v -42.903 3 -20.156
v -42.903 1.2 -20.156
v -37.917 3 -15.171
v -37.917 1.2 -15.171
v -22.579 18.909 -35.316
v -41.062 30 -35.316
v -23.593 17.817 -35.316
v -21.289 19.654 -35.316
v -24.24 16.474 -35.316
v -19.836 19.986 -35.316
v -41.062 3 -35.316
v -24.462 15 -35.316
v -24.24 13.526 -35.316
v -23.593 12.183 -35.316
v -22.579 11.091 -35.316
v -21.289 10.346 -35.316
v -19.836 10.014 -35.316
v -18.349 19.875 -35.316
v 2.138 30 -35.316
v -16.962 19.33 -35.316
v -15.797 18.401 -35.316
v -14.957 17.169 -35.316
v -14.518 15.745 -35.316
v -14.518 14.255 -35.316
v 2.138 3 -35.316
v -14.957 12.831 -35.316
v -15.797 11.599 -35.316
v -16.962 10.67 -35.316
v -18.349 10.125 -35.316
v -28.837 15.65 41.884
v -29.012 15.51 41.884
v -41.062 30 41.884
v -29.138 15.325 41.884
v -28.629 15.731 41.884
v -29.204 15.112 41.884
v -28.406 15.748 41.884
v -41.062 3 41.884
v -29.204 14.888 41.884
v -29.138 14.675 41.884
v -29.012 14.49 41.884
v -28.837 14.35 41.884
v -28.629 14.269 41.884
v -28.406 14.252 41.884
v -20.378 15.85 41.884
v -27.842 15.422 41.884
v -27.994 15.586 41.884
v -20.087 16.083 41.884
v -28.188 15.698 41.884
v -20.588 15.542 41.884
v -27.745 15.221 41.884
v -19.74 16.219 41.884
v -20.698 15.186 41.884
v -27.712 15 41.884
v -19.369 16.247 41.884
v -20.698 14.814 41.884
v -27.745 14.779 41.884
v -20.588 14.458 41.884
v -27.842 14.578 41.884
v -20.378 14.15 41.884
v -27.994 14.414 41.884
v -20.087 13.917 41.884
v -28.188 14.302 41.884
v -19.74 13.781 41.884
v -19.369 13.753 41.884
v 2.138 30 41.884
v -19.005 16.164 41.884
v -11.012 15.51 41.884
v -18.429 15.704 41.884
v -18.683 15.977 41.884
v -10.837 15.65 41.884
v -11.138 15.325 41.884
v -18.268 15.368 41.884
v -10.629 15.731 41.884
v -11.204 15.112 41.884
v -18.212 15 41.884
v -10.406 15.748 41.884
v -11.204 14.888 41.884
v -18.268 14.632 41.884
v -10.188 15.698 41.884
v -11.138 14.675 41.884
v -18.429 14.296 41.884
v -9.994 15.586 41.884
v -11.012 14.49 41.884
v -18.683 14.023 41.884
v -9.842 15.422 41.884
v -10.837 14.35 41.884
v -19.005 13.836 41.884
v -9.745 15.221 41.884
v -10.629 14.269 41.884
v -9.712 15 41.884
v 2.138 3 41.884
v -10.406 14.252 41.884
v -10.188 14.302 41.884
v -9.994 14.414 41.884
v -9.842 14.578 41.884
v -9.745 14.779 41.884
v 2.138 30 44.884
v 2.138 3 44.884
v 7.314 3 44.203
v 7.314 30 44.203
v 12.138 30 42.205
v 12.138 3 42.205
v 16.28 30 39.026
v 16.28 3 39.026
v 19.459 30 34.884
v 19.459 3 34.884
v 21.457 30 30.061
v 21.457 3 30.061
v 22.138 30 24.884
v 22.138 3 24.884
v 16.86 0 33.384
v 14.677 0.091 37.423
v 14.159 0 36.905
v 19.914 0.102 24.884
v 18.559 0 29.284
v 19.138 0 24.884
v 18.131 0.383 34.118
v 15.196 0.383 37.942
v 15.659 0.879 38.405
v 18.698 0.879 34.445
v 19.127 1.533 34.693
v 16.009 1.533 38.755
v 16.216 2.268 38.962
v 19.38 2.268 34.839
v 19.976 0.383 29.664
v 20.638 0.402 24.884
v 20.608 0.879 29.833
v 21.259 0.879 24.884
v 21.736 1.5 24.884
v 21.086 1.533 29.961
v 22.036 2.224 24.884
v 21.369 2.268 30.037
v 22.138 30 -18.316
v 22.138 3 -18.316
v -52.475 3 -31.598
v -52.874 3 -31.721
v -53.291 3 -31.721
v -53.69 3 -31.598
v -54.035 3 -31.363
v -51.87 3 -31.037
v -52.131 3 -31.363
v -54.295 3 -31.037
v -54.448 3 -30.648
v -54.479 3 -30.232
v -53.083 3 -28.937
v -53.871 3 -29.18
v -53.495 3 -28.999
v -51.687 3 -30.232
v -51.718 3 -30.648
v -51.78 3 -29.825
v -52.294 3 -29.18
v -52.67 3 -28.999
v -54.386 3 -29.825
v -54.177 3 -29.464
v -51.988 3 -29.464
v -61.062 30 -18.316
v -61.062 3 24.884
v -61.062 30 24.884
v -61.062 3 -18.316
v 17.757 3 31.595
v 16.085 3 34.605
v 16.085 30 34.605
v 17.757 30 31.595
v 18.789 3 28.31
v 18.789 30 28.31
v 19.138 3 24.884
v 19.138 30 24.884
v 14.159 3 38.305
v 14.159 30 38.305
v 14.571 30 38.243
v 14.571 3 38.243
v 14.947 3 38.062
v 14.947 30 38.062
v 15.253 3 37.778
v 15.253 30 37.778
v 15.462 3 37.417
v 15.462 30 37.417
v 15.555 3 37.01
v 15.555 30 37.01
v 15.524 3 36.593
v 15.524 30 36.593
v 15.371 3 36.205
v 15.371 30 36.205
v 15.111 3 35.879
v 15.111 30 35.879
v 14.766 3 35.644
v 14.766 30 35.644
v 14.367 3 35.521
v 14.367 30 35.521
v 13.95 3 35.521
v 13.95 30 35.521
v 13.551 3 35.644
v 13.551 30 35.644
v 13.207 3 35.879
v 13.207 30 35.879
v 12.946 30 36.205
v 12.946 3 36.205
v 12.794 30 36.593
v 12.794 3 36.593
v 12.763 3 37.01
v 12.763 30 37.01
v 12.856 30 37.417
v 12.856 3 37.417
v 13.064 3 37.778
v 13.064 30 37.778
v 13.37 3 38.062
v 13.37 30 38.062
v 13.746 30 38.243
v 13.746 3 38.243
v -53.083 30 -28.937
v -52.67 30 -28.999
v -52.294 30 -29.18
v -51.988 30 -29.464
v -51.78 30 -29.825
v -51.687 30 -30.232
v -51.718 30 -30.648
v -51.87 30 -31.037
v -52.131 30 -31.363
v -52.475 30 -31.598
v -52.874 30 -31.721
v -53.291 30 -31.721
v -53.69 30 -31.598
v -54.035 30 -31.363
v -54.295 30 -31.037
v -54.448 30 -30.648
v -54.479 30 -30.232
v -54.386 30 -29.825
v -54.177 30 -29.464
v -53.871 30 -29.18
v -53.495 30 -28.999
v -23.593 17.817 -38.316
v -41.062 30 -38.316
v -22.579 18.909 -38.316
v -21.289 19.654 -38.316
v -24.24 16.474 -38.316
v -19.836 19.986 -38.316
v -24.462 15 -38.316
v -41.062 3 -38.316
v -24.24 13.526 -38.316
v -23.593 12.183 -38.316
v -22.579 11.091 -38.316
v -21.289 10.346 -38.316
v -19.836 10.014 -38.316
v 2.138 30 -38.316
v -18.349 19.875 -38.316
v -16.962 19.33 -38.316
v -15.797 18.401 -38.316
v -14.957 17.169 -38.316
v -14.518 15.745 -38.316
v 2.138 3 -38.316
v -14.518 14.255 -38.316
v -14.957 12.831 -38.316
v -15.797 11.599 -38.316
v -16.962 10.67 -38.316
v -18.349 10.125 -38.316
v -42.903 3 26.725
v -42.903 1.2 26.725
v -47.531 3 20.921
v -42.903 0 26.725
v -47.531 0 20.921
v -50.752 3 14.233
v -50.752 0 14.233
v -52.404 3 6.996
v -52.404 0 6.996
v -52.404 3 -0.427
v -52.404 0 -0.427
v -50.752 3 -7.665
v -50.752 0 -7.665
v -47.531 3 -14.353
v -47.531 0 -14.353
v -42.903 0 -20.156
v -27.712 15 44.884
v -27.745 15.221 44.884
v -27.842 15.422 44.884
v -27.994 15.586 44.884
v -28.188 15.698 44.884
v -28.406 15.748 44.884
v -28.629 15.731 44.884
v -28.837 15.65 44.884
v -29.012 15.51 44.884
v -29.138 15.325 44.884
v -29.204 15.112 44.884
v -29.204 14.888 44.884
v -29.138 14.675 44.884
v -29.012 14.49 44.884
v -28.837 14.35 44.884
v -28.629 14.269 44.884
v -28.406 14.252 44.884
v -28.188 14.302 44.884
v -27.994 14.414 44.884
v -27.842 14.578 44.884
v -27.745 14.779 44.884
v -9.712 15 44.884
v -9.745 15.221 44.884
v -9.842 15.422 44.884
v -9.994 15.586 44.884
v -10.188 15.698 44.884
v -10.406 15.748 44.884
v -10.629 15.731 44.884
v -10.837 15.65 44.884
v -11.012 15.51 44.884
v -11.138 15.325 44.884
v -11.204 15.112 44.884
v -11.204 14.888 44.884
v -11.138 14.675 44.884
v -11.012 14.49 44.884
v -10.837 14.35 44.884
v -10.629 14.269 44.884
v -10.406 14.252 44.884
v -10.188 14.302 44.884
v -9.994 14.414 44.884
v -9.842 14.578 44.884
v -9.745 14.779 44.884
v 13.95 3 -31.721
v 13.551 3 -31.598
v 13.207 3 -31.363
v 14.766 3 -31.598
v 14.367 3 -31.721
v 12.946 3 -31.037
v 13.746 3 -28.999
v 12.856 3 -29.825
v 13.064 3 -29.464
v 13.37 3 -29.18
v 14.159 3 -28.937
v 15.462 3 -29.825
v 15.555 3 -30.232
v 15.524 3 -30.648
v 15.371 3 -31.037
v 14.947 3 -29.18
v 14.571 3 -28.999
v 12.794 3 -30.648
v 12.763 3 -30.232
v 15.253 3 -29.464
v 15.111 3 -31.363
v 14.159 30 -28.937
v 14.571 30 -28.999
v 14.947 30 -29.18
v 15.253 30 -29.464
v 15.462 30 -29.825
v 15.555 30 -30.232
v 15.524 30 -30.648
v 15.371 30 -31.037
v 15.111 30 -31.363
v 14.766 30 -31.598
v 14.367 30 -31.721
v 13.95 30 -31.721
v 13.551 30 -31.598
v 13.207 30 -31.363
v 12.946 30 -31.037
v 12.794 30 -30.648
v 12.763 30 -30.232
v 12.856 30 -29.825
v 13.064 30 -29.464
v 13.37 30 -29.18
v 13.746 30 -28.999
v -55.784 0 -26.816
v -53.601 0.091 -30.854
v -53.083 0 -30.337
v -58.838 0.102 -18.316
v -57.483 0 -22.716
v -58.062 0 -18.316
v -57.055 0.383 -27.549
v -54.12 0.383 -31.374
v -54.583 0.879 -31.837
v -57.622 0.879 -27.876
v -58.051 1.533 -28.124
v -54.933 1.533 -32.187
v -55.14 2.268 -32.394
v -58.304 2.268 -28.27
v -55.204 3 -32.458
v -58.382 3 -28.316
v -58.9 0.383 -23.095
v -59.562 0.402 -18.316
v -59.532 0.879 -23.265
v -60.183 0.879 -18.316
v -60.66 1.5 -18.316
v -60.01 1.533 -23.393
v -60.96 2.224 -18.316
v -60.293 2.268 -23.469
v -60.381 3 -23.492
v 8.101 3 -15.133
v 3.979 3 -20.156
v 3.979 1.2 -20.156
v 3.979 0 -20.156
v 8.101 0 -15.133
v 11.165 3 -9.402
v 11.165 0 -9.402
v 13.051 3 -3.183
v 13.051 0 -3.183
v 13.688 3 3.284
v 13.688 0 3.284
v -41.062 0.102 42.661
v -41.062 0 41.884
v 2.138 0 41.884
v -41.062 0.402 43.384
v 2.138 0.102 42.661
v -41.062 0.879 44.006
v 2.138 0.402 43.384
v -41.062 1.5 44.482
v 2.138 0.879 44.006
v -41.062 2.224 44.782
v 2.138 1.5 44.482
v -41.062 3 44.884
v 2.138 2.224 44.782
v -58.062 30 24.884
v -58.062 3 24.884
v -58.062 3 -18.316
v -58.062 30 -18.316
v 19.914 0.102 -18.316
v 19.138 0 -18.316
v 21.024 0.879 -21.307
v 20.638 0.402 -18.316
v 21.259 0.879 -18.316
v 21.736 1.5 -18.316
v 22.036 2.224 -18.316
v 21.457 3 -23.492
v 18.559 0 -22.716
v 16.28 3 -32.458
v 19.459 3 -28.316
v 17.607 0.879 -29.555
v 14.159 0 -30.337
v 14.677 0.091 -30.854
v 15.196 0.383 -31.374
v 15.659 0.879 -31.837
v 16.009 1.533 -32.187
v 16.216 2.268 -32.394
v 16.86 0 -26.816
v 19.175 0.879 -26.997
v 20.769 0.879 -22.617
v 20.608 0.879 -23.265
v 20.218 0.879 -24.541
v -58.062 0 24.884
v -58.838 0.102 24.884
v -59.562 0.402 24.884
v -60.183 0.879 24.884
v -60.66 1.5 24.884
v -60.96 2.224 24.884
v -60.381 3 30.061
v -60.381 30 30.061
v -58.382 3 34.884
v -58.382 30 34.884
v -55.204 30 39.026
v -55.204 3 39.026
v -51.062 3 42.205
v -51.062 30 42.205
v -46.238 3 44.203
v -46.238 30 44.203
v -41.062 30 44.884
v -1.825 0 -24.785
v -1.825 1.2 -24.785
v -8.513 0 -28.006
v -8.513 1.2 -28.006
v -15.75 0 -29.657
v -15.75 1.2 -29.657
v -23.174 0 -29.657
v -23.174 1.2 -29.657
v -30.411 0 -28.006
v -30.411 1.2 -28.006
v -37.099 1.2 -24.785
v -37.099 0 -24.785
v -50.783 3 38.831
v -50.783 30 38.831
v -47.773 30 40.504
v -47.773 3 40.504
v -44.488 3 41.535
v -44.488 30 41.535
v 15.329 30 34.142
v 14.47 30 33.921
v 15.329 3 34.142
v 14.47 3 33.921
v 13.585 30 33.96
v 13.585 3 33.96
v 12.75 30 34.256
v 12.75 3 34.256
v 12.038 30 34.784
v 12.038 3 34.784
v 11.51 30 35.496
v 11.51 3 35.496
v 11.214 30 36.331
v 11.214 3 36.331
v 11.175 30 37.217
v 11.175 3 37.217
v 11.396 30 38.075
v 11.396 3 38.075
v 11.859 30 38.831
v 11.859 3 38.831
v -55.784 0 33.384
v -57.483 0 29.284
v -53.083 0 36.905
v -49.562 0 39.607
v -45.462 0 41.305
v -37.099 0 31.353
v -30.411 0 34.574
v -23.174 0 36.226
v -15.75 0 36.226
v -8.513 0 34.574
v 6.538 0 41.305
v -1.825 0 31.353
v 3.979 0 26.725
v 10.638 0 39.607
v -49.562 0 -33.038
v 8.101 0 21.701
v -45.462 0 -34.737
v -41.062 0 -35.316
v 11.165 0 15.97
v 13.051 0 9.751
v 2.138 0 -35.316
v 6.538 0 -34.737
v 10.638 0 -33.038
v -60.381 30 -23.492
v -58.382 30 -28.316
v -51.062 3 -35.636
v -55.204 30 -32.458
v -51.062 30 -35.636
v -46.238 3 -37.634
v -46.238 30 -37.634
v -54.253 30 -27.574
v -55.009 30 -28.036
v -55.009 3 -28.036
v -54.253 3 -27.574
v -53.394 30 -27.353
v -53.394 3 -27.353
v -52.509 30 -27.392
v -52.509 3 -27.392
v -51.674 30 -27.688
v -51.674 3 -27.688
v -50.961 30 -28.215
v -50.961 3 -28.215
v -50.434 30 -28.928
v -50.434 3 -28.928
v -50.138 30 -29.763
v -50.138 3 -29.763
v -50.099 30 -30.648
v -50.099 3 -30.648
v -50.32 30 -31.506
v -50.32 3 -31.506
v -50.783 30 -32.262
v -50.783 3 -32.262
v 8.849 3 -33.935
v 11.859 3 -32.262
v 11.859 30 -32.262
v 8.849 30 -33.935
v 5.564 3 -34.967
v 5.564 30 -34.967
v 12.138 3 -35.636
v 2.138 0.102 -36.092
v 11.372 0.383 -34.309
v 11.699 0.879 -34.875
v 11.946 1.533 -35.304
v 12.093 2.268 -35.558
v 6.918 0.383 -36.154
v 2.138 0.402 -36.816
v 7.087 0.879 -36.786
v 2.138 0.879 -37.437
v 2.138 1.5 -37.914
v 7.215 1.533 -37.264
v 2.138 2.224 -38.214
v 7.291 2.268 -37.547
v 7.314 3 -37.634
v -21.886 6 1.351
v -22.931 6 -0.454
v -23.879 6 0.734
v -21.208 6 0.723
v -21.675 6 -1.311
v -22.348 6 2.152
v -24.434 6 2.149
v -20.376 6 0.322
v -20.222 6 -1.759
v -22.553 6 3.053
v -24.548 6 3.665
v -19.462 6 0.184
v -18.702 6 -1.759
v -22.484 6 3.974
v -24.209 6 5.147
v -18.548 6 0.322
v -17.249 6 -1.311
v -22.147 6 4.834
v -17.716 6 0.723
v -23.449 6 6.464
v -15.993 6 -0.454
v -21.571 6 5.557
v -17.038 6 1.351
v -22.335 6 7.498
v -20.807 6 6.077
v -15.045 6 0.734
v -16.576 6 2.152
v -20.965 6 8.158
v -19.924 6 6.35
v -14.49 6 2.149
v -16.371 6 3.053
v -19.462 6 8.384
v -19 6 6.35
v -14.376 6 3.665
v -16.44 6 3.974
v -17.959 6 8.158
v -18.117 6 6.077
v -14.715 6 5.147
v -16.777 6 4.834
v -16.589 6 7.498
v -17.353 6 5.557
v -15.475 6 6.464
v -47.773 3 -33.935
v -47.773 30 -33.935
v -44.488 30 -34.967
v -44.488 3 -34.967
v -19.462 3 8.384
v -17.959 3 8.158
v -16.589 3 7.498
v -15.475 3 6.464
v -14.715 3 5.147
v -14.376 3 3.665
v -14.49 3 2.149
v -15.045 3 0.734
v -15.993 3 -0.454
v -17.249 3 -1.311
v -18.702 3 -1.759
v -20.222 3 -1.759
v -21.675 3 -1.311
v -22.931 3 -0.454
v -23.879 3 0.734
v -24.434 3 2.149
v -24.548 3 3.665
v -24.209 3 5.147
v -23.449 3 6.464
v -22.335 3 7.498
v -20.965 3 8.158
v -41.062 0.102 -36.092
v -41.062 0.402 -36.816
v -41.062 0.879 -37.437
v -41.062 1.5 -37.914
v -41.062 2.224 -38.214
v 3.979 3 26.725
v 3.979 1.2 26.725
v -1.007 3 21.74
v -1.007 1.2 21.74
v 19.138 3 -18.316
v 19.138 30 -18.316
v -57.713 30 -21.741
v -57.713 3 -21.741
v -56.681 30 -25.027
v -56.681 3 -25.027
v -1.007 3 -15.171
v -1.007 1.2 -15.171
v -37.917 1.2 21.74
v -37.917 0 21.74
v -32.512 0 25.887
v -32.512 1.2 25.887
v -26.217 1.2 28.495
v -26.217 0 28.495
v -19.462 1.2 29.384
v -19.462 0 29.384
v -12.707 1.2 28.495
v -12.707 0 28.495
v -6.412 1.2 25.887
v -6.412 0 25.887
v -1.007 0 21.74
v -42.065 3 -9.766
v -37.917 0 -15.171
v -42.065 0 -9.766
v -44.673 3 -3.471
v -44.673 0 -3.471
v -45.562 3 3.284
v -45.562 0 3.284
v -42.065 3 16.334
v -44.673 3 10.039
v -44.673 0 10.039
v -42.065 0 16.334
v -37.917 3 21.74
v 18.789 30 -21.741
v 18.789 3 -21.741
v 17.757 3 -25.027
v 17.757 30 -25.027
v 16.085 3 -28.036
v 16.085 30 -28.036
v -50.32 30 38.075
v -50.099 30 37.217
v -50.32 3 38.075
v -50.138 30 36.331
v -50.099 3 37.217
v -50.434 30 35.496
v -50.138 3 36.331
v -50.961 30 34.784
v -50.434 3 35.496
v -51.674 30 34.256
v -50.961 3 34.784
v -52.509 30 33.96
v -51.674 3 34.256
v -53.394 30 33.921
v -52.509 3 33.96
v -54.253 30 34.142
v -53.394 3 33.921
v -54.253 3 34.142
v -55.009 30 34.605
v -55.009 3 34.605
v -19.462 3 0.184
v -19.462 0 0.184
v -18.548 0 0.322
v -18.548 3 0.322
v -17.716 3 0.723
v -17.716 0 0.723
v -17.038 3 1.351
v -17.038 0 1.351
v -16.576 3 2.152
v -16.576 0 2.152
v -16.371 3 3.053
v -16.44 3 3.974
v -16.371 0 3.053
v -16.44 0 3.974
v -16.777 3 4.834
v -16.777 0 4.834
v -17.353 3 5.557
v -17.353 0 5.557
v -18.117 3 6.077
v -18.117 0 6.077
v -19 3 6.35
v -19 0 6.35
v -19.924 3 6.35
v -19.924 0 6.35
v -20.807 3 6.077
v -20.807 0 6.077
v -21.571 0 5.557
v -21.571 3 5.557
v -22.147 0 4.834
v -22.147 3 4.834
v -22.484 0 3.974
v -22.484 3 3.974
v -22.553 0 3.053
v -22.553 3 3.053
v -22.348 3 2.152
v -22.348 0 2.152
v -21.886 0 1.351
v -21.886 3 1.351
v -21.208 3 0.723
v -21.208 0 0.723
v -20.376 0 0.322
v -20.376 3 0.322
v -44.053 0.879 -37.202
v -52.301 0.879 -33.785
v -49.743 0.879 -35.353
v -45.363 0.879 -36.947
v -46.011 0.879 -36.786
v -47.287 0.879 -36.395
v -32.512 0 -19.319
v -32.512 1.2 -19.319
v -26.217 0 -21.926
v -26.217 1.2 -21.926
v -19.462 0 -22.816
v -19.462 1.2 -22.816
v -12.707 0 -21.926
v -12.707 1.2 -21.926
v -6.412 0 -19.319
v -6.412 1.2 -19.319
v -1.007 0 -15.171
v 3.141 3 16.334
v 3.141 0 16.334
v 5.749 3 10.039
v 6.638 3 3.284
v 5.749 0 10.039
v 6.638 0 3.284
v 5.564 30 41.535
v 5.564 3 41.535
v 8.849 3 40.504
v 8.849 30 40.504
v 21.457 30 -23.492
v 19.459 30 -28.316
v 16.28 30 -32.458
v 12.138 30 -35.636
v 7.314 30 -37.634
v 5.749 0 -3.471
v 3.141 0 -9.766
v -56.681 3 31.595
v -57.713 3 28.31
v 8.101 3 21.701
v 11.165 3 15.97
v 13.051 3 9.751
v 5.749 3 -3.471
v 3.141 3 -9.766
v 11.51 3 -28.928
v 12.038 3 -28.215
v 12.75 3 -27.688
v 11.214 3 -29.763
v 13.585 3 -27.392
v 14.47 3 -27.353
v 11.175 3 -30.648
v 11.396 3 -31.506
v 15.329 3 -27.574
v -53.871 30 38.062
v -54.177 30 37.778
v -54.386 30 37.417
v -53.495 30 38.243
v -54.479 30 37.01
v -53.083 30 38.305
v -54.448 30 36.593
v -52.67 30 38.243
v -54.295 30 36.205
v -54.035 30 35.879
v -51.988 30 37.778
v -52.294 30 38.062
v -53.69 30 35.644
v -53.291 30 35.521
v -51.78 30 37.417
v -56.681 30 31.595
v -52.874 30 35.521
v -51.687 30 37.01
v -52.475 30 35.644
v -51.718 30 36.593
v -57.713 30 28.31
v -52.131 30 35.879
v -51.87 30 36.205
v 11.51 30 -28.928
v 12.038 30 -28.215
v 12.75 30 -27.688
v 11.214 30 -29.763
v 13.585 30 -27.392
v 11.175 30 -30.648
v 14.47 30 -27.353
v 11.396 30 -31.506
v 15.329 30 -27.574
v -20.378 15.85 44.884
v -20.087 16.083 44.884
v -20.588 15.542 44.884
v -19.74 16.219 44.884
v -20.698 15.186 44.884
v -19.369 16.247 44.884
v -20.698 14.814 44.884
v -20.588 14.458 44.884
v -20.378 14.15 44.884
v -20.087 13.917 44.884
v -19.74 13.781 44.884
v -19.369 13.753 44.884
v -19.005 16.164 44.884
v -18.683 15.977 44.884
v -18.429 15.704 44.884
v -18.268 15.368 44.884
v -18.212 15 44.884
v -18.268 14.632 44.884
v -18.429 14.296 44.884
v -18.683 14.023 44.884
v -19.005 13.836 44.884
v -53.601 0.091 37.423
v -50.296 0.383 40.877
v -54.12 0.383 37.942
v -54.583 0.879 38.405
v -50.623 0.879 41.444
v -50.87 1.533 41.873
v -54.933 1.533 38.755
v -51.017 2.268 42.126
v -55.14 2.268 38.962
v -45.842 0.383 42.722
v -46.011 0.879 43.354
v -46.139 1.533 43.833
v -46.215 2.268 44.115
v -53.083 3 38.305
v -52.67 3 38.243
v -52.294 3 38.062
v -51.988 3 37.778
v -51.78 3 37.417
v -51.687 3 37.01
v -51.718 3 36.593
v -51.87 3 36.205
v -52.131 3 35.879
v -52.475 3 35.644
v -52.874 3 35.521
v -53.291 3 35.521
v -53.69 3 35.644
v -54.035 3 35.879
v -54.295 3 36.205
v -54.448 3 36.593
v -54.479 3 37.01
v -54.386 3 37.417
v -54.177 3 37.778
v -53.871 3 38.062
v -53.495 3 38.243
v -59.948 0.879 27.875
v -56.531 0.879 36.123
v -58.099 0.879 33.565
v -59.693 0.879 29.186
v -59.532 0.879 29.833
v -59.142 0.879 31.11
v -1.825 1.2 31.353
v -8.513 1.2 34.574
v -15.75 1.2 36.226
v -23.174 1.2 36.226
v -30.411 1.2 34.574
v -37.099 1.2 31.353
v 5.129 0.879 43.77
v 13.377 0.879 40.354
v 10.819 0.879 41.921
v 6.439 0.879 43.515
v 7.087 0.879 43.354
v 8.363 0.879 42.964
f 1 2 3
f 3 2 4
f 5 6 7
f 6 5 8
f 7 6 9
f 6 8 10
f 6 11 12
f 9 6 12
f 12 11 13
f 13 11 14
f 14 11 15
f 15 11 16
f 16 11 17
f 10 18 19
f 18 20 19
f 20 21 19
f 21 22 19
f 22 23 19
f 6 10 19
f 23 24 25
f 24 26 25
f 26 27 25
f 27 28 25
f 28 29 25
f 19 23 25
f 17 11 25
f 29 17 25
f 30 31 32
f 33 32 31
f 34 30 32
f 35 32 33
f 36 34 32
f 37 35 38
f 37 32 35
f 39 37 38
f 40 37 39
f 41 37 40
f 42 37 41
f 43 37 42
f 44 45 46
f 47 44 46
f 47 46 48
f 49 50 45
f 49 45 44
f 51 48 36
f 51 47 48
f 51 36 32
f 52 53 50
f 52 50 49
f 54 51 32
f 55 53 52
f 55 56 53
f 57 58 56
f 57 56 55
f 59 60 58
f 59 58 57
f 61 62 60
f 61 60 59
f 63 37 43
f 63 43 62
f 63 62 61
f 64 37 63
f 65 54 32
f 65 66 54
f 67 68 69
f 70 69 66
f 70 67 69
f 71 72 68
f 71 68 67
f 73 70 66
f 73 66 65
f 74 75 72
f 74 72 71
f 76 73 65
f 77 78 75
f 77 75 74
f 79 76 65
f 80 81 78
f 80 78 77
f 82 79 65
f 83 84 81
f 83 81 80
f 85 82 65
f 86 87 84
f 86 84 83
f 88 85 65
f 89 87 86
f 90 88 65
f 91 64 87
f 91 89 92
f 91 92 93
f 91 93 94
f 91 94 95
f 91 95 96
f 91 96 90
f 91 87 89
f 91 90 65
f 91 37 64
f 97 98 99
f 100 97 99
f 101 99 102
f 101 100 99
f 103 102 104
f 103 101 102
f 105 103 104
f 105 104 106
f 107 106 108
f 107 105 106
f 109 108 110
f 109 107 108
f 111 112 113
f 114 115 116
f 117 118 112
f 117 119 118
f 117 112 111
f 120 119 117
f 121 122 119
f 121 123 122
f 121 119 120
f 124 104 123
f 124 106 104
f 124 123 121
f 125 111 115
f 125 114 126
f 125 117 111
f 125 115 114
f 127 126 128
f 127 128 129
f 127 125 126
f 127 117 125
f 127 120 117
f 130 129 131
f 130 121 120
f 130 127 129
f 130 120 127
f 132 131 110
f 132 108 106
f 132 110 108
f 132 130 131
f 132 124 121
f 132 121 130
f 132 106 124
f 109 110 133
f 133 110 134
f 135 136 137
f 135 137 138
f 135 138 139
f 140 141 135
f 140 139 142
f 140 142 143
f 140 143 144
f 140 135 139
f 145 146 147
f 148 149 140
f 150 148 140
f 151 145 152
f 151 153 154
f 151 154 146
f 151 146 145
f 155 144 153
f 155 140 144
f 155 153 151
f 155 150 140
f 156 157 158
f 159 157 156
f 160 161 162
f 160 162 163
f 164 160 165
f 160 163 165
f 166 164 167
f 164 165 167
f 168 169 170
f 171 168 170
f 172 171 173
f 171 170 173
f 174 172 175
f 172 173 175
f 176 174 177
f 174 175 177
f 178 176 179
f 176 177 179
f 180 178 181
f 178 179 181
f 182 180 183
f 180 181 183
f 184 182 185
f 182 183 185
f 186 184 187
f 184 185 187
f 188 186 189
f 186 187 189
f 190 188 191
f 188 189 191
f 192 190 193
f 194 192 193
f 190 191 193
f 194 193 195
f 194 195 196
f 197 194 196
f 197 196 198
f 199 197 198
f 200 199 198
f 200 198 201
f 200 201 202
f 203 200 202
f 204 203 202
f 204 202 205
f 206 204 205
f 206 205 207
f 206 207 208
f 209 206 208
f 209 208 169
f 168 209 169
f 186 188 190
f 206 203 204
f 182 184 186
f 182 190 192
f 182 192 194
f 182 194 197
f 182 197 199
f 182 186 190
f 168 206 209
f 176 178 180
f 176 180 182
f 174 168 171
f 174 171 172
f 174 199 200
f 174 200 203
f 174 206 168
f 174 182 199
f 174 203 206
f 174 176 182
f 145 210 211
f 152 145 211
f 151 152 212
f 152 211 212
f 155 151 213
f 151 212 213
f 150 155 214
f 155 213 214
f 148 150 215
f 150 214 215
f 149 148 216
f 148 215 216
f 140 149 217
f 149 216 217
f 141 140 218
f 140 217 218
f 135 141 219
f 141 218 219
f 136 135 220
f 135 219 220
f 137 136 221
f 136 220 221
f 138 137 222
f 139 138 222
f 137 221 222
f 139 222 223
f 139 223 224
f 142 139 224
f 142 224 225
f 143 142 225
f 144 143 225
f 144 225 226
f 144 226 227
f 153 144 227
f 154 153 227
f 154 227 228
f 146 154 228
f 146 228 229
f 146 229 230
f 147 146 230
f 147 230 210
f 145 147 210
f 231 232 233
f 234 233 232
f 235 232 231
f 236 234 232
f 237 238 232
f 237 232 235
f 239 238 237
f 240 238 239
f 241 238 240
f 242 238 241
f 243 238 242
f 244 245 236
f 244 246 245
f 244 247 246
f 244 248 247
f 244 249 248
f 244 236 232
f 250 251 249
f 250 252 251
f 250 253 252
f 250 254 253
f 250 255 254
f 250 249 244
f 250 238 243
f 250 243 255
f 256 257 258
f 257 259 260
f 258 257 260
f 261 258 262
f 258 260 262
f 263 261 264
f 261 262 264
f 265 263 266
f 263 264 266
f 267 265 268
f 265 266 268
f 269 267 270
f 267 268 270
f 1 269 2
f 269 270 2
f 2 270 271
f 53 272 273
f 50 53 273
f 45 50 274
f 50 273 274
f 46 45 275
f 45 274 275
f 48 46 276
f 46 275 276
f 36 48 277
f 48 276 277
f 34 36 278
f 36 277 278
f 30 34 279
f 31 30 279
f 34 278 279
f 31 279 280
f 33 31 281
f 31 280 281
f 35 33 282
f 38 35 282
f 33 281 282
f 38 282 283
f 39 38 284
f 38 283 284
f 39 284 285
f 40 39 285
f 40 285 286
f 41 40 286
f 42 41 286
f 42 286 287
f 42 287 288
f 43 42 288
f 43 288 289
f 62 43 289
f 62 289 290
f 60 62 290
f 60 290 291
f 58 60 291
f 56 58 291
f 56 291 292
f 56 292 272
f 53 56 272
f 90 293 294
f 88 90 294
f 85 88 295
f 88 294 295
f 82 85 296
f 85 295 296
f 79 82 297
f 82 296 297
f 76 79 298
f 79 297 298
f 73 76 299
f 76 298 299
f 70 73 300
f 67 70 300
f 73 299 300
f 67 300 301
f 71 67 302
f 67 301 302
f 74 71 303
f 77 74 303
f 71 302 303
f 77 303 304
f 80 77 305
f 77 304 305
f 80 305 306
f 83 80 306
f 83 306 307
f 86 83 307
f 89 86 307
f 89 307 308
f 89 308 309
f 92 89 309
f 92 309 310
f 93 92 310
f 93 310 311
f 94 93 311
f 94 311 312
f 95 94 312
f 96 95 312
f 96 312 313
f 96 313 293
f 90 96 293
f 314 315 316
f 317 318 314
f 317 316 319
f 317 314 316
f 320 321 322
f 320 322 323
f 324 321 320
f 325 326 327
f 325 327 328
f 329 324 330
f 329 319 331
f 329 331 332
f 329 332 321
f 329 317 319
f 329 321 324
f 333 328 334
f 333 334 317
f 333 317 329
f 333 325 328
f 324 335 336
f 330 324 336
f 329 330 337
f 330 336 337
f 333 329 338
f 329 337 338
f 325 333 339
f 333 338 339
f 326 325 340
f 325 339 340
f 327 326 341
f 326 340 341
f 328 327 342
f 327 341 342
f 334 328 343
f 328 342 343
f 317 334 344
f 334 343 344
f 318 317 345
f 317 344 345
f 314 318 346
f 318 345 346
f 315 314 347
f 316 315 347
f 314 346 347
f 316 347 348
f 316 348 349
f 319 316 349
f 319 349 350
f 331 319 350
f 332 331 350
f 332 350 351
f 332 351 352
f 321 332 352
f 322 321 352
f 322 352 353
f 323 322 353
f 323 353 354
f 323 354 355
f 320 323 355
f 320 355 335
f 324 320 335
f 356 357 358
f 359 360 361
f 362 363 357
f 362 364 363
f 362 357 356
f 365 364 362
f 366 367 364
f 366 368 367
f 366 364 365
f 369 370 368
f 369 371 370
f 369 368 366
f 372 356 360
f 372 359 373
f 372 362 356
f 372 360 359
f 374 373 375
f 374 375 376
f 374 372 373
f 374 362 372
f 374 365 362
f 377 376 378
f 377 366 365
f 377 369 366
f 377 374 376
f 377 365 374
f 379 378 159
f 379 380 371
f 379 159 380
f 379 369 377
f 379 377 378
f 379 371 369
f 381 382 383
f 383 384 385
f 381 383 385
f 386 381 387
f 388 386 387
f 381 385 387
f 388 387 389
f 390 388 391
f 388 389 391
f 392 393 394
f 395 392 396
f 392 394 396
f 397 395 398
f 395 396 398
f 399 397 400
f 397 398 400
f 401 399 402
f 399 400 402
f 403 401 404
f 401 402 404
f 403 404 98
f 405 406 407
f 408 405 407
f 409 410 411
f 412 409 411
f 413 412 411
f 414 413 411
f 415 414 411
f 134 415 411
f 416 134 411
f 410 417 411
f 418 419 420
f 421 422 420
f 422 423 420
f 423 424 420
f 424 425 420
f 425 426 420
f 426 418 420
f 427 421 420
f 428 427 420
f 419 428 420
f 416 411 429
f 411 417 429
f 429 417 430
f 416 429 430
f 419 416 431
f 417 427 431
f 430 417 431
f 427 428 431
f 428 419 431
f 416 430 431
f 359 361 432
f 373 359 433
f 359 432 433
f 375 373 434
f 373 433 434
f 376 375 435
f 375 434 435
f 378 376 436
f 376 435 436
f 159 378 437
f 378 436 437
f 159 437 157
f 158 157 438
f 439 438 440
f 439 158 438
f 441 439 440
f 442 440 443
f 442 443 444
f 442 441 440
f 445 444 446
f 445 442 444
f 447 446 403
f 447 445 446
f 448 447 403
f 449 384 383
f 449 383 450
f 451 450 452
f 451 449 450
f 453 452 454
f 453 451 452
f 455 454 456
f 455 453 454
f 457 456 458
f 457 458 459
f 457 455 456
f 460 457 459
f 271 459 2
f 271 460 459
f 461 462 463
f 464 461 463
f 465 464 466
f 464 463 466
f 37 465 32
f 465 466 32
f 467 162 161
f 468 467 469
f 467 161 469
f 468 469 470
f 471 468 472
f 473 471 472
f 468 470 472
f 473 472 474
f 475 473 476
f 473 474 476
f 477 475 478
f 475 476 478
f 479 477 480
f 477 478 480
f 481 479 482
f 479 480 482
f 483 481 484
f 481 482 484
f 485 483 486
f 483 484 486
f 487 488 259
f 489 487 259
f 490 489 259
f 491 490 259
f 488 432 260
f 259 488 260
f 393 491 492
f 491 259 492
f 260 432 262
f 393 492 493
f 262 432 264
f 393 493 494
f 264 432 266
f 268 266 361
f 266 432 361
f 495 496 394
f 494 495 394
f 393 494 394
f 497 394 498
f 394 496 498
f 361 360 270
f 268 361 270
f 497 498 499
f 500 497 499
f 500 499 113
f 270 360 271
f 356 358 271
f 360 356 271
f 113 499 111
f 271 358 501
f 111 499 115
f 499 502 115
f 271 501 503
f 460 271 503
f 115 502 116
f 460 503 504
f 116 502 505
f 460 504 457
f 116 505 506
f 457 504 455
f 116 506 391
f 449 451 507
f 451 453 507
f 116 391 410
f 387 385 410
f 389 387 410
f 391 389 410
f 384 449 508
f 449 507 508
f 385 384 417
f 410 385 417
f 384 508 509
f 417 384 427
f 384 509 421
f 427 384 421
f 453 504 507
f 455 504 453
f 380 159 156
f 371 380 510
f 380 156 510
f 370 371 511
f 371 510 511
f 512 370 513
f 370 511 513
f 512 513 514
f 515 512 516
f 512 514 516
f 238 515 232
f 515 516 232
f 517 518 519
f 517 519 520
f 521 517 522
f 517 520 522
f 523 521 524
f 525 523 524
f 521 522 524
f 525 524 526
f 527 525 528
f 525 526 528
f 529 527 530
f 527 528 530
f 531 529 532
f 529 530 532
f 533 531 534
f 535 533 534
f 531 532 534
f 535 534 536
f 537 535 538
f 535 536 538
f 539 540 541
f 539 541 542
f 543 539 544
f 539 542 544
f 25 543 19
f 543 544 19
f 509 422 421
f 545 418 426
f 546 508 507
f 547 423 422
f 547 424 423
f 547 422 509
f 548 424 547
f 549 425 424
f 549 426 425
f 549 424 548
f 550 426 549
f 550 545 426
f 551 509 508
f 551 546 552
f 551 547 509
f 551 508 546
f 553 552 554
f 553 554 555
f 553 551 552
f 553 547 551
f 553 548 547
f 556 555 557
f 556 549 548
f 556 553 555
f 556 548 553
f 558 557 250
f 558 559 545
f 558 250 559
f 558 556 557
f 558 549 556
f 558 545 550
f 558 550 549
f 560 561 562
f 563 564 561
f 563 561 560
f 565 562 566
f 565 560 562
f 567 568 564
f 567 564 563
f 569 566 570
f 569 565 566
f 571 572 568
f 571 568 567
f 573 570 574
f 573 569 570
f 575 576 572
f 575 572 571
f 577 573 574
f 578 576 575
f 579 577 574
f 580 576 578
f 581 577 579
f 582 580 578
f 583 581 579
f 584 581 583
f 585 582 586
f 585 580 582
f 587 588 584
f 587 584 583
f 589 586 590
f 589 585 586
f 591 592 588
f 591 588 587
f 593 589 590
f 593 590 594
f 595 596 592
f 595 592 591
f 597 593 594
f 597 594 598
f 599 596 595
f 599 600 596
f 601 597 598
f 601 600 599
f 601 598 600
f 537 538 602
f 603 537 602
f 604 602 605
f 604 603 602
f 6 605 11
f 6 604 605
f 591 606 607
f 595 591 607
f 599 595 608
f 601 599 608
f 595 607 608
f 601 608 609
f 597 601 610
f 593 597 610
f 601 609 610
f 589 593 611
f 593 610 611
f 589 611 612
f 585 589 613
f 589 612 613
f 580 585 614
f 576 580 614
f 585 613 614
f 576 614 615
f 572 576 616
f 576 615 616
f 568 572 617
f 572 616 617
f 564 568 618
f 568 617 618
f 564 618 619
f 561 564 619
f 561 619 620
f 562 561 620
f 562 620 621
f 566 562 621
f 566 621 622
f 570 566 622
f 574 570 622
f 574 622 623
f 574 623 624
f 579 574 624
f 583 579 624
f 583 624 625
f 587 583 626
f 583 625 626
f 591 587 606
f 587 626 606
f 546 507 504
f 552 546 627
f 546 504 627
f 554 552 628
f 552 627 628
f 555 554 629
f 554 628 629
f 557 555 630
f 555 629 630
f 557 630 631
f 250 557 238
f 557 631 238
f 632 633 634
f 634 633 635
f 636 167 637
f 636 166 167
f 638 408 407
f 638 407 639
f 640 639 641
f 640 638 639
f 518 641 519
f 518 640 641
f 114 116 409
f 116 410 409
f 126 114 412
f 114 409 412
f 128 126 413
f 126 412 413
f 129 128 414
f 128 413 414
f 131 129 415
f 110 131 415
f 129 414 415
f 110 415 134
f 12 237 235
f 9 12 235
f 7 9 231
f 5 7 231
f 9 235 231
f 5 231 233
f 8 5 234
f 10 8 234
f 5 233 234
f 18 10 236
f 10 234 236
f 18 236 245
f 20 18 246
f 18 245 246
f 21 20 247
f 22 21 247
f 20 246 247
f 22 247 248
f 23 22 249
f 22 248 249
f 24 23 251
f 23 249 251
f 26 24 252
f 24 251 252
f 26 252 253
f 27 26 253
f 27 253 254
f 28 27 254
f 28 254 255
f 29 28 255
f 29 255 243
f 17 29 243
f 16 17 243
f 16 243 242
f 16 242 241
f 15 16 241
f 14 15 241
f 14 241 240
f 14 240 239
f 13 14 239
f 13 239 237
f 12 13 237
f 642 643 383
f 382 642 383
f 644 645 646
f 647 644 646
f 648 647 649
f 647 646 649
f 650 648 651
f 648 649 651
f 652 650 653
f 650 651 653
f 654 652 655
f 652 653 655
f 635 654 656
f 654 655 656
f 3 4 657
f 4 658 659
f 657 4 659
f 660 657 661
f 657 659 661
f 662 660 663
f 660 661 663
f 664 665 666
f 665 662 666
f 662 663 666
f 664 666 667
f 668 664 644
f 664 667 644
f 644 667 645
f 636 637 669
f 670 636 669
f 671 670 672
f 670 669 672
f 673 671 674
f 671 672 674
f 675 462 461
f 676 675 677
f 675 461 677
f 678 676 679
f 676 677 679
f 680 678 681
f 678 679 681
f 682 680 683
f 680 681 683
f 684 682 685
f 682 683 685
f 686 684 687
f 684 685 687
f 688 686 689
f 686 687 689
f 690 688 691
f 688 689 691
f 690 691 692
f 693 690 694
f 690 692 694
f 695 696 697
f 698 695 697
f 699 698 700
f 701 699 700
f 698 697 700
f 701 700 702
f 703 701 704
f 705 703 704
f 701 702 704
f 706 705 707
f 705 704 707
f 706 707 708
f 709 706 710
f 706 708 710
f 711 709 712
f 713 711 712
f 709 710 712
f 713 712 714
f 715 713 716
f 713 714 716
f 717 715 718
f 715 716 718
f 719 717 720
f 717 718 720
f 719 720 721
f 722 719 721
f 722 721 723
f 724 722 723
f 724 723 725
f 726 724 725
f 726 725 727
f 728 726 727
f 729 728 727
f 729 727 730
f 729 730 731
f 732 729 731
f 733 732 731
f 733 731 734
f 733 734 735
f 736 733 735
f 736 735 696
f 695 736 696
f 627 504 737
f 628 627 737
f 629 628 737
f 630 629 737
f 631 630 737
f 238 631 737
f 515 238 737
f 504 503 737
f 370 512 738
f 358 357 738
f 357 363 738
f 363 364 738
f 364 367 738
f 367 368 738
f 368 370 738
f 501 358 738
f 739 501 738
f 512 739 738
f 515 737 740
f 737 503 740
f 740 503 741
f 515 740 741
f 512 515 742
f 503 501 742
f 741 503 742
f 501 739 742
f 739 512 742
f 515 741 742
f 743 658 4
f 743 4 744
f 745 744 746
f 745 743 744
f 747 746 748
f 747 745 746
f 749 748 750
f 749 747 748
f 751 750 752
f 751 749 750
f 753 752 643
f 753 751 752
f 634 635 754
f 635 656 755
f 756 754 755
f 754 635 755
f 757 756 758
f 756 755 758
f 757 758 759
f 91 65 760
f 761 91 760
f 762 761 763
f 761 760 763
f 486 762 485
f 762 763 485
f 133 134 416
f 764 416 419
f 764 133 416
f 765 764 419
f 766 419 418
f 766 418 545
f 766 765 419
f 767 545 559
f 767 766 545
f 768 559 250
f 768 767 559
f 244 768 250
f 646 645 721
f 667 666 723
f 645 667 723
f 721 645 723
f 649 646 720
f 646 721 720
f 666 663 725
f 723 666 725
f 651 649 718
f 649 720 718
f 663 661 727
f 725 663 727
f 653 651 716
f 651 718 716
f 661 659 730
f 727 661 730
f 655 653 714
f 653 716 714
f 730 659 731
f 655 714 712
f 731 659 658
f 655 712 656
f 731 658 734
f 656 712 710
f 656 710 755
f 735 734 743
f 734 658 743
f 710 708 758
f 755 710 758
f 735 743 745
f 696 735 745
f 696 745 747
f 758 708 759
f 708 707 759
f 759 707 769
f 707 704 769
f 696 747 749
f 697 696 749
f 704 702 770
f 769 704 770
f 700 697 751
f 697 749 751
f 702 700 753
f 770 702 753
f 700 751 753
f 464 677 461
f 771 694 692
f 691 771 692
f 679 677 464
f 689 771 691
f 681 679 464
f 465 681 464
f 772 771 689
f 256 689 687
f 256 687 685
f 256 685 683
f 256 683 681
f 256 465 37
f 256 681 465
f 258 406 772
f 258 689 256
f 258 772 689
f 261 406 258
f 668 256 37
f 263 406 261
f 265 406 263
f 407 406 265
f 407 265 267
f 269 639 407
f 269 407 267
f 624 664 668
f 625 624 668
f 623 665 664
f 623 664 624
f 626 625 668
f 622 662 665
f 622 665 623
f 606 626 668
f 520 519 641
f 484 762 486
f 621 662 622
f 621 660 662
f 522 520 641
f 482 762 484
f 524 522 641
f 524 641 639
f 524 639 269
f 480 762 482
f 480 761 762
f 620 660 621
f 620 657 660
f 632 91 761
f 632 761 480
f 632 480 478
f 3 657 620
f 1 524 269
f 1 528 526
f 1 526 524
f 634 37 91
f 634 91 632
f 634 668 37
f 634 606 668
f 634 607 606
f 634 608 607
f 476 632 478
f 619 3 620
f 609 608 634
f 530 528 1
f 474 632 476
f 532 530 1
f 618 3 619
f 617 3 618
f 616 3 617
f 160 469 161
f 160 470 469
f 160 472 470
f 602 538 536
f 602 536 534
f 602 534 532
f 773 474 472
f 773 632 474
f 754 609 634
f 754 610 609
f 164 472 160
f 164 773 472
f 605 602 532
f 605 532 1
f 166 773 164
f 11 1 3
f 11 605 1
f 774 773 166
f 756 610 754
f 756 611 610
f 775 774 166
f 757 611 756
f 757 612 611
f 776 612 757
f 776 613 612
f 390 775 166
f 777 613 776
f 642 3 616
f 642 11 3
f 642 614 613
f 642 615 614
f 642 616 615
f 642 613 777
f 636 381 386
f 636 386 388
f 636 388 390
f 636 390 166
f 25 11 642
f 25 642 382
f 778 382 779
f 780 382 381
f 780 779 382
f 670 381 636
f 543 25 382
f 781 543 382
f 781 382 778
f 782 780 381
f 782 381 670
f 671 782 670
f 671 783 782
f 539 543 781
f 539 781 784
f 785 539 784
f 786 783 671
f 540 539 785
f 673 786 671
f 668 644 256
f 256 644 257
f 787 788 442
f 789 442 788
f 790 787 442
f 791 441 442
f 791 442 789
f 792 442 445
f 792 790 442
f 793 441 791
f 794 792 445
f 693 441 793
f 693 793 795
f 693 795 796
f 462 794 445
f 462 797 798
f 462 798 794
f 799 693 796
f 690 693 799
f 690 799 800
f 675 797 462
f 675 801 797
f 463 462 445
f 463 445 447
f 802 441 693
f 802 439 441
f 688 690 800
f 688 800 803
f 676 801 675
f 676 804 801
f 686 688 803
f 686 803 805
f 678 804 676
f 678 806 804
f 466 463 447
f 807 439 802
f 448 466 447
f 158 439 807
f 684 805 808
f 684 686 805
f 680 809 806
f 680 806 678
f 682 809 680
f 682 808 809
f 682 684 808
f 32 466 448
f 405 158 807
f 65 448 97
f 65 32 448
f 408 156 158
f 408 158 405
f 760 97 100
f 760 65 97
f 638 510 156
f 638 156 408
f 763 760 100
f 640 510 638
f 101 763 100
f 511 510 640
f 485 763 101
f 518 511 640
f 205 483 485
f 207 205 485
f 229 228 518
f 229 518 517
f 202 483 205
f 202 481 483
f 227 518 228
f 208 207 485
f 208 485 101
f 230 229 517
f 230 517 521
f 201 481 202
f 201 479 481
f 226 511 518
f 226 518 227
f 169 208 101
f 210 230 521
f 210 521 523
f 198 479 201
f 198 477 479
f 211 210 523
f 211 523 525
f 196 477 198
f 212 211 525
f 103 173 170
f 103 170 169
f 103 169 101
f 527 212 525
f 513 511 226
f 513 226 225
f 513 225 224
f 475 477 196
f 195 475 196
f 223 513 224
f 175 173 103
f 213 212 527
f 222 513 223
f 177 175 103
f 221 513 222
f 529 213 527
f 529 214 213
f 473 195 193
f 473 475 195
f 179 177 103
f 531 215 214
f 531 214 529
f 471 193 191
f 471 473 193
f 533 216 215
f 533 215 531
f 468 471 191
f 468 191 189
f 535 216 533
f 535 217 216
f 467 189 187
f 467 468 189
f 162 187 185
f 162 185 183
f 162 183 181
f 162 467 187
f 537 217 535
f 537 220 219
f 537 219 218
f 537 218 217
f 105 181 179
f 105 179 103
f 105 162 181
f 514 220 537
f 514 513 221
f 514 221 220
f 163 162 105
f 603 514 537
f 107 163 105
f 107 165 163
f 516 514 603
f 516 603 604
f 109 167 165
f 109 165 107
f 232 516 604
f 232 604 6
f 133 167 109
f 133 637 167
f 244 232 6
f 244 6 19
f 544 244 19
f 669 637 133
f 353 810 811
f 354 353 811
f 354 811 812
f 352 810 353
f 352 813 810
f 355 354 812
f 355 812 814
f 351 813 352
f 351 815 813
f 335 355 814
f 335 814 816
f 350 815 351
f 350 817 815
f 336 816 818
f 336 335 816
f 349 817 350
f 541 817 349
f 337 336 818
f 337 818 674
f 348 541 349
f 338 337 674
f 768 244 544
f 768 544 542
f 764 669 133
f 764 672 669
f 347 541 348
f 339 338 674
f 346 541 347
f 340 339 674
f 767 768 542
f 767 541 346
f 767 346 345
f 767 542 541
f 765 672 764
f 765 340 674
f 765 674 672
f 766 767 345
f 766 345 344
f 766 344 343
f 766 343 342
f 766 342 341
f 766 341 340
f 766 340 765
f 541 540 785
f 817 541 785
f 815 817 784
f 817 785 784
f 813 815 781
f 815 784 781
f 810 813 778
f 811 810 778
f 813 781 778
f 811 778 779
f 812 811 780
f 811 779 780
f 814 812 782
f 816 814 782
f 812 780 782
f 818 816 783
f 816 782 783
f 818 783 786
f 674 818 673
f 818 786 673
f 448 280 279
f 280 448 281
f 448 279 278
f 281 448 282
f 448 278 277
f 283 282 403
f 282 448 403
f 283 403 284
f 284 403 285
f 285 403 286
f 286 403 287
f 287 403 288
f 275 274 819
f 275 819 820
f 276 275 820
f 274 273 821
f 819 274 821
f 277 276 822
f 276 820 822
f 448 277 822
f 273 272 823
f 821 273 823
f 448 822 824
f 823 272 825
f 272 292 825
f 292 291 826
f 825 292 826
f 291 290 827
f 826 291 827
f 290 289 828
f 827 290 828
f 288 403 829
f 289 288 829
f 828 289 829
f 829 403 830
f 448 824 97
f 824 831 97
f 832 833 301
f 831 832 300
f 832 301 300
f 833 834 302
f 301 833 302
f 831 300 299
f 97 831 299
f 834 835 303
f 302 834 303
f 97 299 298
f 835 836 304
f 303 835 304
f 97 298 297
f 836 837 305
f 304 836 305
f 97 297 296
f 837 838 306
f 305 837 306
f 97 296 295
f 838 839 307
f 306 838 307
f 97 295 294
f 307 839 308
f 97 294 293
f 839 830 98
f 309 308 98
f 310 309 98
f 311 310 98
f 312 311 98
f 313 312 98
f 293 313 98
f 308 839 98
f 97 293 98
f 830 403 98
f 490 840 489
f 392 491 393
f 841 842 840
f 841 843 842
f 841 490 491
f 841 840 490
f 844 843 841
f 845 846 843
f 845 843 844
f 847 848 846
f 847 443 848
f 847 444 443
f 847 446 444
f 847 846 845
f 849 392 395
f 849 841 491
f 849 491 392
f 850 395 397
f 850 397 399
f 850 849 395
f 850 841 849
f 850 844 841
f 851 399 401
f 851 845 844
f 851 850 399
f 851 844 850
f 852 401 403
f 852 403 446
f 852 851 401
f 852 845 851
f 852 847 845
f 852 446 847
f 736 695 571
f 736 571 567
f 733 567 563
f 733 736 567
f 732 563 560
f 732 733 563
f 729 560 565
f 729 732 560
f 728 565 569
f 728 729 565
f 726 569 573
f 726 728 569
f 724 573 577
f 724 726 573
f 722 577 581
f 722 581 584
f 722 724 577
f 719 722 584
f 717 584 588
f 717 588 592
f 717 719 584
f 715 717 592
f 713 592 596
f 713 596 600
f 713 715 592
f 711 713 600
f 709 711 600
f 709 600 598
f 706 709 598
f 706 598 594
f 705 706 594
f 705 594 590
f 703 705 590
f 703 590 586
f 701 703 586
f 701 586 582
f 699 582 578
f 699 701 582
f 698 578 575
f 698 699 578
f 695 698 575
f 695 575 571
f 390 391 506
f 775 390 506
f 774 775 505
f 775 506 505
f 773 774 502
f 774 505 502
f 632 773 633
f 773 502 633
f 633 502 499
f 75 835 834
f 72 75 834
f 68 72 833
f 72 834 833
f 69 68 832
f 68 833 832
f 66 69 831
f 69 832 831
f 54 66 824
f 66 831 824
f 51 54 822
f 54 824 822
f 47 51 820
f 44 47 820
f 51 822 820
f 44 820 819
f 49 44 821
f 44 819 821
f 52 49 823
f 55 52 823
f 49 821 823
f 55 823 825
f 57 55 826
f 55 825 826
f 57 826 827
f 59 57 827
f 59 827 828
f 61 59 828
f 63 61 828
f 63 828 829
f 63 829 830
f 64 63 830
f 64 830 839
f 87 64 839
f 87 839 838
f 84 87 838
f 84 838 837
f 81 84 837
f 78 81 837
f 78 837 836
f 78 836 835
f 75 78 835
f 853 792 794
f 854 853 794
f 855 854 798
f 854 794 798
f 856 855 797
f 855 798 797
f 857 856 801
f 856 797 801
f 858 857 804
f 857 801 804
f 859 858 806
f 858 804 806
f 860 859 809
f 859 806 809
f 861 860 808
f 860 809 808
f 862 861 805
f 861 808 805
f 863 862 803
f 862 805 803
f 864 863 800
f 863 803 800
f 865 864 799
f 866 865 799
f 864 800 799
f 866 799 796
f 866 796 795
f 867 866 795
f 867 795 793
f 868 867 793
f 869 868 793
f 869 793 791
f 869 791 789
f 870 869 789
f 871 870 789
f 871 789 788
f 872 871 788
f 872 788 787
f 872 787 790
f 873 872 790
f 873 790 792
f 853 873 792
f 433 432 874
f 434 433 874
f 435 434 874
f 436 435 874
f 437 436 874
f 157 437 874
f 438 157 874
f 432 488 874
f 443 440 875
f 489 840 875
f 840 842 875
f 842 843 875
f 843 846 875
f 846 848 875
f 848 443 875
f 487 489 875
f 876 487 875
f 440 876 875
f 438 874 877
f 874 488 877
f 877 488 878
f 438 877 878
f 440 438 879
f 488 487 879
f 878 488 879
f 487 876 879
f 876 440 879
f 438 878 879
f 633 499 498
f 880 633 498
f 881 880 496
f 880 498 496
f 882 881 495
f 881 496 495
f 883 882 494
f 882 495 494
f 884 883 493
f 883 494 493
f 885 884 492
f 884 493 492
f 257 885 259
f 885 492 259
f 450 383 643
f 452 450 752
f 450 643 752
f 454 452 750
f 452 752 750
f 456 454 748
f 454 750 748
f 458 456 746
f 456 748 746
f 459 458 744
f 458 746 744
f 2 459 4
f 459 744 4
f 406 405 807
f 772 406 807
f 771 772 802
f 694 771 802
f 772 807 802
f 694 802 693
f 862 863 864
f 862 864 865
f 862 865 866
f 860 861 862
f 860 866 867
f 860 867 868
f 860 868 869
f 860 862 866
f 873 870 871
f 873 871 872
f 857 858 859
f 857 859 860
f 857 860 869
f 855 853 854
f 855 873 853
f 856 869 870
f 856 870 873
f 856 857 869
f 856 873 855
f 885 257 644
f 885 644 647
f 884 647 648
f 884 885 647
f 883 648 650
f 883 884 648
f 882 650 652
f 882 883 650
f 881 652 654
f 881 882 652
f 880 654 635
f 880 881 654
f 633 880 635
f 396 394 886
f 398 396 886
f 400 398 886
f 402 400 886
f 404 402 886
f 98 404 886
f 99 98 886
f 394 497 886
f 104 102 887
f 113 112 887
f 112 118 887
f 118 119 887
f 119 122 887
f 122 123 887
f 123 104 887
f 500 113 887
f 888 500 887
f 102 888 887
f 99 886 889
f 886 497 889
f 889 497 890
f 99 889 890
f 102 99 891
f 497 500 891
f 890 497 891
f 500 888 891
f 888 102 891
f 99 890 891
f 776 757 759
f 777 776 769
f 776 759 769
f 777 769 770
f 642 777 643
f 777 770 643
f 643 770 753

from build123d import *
from build123d.topology import SkipClean

# Parameters (mm, degrees)
SKETCH1_W           = 83.2
SKETCH1_H           = 83.2
BOSS_EXTRUDE1_DEPTH = 30
FILLET1_R           = 20
SHELL2_T            = -3
SKETCH2_R           = 1.25
SKETCH2_R_2         = 0.75
CUT_EXTRUDE1_DEPTH  = 30
SKETCH3_R           = 5
CUT_EXTRUDE2_DEPTH  = 30
SKETCH4_R           = 3.1
CUT_EXTRUDE3_DEPTH  = 30
CUT_EXTRUDE4_DEPTH  = 1.2
SKETCH6_R           = 5.1
SKETCH6_R_2         = 3.1
BOSS_EXTRUDE2_DEPTH = 3
SKETCH7_R           = 3
BOSS_EXTRUDE3_DEPTH = 27
SKETCH9_R           = 1.4
CUT_EXTRUDE5_DEPTH  = 27
FILLET2_R           = 3


with BuildPart() as part:
    # Sketch1 → Boss-Extrude1 (new body)
    with BuildSketch(Plane(origin=(0, 0, 0), x_dir=(1, 0, 0), z_dir=(0, 1, 0))):
        with Locations((-19.461988304, -3.284210526)):
            Rectangle(SKETCH1_W, SKETCH1_H)
    extrude(amount=BOSS_EXTRUDE1_DEPTH)

    # Fillet1
    fillet1_edges = [part.edges().sort_by_distance(p)[0] for p in [
        (-61.061988304, 15, -38.315789474),
        (22.138011696, 15, -38.315789474),
        (22.138011696, 15, 44.884210526),
        (-61.061988304, 15, 44.884210526),
    ]]
    fillet(fillet1_edges, radius=FILLET1_R)

    # Shell2
    shell2_openings = [part.faces().sort_by_distance(p)[0] for p in [
        (-19.461988304, 30, 3.284210526),
    ]]
    offset(amount=SHELL2_T, openings=shell2_openings, kind=Kind.INTERSECTION)

    # Sketch2 → Cut-Extrude1 (cut)
    with BuildSketch(Plane.XY.offset(44.884210526)):
        with Locations((-19.461988304, 15)):
            Circle(SKETCH2_R)
        with Locations((-10.461988304, 15)):
            Circle(SKETCH2_R_2)
        with Locations((-28.461988304, 15)):
            Circle(SKETCH2_R_2)
    extrude(amount=-CUT_EXTRUDE1_DEPTH, mode=Mode.SUBTRACT)

    # Sketch3 → Cut-Extrude2 (cut)
    with BuildSketch(Plane(origin=(0, 0, -38.315789474), x_dir=(-1, 0, 0), z_dir=(0, 0, -1))):
        with Locations((19.461988304, 15)):
            Circle(SKETCH3_R)
    extrude(amount=-CUT_EXTRUDE2_DEPTH, mode=Mode.SUBTRACT)

    # Sketch4 → Cut-Extrude3 (cut)
    with BuildSketch(Plane.XZ):
        with BuildLine():
            ThreePointArc((13.688011696, 3.284210526), (11.164618199, 15.970166309), (3.978601492, 26.724800323))
            Line((3.978601492, 26.724800323), (-1.006501315, 21.739697515))
            ThreePointArc((-1.006501315, 21.739697515), (4.651267494, 13.272248111), (6.638011696, 3.284210526))
            ThreePointArc((6.638011696, 3.284210526), (4.651267494, -6.703827058), (-1.006501315, -15.171276463))
            Line((-1.006501315, -15.171276463), (3.978601492, -20.15637927))
            ThreePointArc((3.978601492, -20.15637927), (11.164618199, -9.401745257), (13.688011696, 3.284210526))
        make_face()
        with BuildLine():
            Line((-37.917475293, 21.739697515), (-42.9025781, 26.724800323))
            ThreePointArc((-42.9025781, 26.724800323), (-52.611988304, 3.284210526), (-42.9025781, -20.15637927))
            Line((-42.9025781, -20.15637927), (-37.917475293, -15.171276463))
            ThreePointArc((-37.917475293, -15.171276463), (-45.561988304, 3.284210526), (-37.917475293, 21.739697515))
        make_face()
        with Locations(Location((-19.461988304, 3.284210526, 0), (0, 0, 270))):
            Circle(SKETCH4_R)
    extrude(amount=-CUT_EXTRUDE3_DEPTH, mode=Mode.SUBTRACT)

    # Sketch5 → Cut-Extrude4 (cut)
    with SkipClean():  # the faces are left unmerged after this step: merging them gives an invalid solid
        with BuildSketch(Plane.XZ):
            with BuildLine():
                Line((-42.9025781, 26.724800323), (-37.917475293, 21.739697515))
                ThreePointArc((-37.917475293, 21.739697515), (-19.461988304, 29.384210526), (-1.006501315, 21.739697515))
                Line((-1.006501315, 21.739697515), (3.978601492, 26.724800323))
                ThreePointArc((3.978601492, 26.724800323), (-19.461988304, 36.434210526), (-42.9025781, 26.724800323))
            make_face()
            with BuildLine():
                Line((-1.006501315, -15.171276463), (3.978601492, -20.15637927))
                ThreePointArc((3.978601492, -20.15637927), (-19.461988304, -29.865789474), (-42.9025781, -20.15637927))
                Line((-42.9025781, -20.15637927), (-37.917475293, -15.171276463))
                ThreePointArc((-37.917475293, -15.171276463), (-19.461988304, -22.815789474), (-1.006501315, -15.171276463))
            make_face()
        extrude(amount=-CUT_EXTRUDE4_DEPTH, mode=Mode.SUBTRACT)

    # Sketch6 → Boss-Extrude2 (add)
    with SkipClean():  # the faces are left unmerged after this step: merging them gives an invalid solid
        with BuildSketch(Plane(origin=(0, 3, 0), x_dir=(1, 0, 0), z_dir=(0, 1, 0))):
            with Locations(Location((-19.461988304, -3.284210526, 0), (0, 0, 270))):
                Circle(SKETCH6_R)
            with Locations(Location((-19.461988304, -3.284210526, 0), (0, 0, 90))):
                Circle(SKETCH6_R_2, mode=Mode.SUBTRACT)
        extrude(amount=BOSS_EXTRUDE2_DEPTH)

    # Sketch7 → Boss-Extrude3 (add)
    with SkipClean():  # the faces are left unmerged after this step: merging them gives an invalid solid
        with BuildSketch(Plane(origin=(0, 3, 0), x_dir=(1, 0, 0), z_dir=(0, 1, 0))):
            with Locations((-53.082803584, 30.336604754)):
                Circle(SKETCH7_R)
            with Locations((-53.082803584, -36.905025806)):
                Circle(SKETCH7_R)
            with Locations((14.158826976, -36.905025806)):
                Circle(SKETCH7_R)
            with Locations((14.158826976, 30.336604754)):
                Circle(SKETCH7_R)
        extrude(amount=BOSS_EXTRUDE3_DEPTH)

    # Sketch9 → Cut-Extrude5 (cut)
    with SkipClean():  # the faces are left unmerged after this step: merging them gives an invalid solid
        with BuildSketch(Plane(origin=(0, 30, 0), x_dir=(1, 0, 0), z_dir=(0, 1, 0))):
            with Locations(Location((-53.082803584, 30.336604754, 0), (0, 0, 270))):
                Circle(SKETCH9_R)
            with Locations(Location((14.158826976, 30.336604754, 0), (0, 0, 270))):
                Circle(SKETCH9_R)
            with Locations(Location((14.158826976, -36.905025806, 0), (0, 0, 270))):
                Circle(SKETCH9_R)
            with Locations(Location((-53.082803584, -36.905025806, 0), (0, 0, 270))):
                Circle(SKETCH9_R)
        extrude(amount=-CUT_EXTRUDE5_DEPTH, mode=Mode.SUBTRACT)

    # Fillet2
    fillet2_edges = [part.edges().sort_by_distance(p)[0] for p in [
        (22.138011696, 0, 3.284210526),
        (-61.061988304, 0, 3.284210526),
        (-19.461988304, 0, -38.315789474),
        (-19.461988304, 0, 44.884210526),
        (-55.204123928, 0, 39.02634615),
        (-55.204123928, 0, -32.457925097),
        (16.28014732, 0, -32.457925097),
        (16.28014732, 0, 39.02634615),
    ]]
    fillet(fillet2_edges, radius=FILLET2_R)


solid = part.part
